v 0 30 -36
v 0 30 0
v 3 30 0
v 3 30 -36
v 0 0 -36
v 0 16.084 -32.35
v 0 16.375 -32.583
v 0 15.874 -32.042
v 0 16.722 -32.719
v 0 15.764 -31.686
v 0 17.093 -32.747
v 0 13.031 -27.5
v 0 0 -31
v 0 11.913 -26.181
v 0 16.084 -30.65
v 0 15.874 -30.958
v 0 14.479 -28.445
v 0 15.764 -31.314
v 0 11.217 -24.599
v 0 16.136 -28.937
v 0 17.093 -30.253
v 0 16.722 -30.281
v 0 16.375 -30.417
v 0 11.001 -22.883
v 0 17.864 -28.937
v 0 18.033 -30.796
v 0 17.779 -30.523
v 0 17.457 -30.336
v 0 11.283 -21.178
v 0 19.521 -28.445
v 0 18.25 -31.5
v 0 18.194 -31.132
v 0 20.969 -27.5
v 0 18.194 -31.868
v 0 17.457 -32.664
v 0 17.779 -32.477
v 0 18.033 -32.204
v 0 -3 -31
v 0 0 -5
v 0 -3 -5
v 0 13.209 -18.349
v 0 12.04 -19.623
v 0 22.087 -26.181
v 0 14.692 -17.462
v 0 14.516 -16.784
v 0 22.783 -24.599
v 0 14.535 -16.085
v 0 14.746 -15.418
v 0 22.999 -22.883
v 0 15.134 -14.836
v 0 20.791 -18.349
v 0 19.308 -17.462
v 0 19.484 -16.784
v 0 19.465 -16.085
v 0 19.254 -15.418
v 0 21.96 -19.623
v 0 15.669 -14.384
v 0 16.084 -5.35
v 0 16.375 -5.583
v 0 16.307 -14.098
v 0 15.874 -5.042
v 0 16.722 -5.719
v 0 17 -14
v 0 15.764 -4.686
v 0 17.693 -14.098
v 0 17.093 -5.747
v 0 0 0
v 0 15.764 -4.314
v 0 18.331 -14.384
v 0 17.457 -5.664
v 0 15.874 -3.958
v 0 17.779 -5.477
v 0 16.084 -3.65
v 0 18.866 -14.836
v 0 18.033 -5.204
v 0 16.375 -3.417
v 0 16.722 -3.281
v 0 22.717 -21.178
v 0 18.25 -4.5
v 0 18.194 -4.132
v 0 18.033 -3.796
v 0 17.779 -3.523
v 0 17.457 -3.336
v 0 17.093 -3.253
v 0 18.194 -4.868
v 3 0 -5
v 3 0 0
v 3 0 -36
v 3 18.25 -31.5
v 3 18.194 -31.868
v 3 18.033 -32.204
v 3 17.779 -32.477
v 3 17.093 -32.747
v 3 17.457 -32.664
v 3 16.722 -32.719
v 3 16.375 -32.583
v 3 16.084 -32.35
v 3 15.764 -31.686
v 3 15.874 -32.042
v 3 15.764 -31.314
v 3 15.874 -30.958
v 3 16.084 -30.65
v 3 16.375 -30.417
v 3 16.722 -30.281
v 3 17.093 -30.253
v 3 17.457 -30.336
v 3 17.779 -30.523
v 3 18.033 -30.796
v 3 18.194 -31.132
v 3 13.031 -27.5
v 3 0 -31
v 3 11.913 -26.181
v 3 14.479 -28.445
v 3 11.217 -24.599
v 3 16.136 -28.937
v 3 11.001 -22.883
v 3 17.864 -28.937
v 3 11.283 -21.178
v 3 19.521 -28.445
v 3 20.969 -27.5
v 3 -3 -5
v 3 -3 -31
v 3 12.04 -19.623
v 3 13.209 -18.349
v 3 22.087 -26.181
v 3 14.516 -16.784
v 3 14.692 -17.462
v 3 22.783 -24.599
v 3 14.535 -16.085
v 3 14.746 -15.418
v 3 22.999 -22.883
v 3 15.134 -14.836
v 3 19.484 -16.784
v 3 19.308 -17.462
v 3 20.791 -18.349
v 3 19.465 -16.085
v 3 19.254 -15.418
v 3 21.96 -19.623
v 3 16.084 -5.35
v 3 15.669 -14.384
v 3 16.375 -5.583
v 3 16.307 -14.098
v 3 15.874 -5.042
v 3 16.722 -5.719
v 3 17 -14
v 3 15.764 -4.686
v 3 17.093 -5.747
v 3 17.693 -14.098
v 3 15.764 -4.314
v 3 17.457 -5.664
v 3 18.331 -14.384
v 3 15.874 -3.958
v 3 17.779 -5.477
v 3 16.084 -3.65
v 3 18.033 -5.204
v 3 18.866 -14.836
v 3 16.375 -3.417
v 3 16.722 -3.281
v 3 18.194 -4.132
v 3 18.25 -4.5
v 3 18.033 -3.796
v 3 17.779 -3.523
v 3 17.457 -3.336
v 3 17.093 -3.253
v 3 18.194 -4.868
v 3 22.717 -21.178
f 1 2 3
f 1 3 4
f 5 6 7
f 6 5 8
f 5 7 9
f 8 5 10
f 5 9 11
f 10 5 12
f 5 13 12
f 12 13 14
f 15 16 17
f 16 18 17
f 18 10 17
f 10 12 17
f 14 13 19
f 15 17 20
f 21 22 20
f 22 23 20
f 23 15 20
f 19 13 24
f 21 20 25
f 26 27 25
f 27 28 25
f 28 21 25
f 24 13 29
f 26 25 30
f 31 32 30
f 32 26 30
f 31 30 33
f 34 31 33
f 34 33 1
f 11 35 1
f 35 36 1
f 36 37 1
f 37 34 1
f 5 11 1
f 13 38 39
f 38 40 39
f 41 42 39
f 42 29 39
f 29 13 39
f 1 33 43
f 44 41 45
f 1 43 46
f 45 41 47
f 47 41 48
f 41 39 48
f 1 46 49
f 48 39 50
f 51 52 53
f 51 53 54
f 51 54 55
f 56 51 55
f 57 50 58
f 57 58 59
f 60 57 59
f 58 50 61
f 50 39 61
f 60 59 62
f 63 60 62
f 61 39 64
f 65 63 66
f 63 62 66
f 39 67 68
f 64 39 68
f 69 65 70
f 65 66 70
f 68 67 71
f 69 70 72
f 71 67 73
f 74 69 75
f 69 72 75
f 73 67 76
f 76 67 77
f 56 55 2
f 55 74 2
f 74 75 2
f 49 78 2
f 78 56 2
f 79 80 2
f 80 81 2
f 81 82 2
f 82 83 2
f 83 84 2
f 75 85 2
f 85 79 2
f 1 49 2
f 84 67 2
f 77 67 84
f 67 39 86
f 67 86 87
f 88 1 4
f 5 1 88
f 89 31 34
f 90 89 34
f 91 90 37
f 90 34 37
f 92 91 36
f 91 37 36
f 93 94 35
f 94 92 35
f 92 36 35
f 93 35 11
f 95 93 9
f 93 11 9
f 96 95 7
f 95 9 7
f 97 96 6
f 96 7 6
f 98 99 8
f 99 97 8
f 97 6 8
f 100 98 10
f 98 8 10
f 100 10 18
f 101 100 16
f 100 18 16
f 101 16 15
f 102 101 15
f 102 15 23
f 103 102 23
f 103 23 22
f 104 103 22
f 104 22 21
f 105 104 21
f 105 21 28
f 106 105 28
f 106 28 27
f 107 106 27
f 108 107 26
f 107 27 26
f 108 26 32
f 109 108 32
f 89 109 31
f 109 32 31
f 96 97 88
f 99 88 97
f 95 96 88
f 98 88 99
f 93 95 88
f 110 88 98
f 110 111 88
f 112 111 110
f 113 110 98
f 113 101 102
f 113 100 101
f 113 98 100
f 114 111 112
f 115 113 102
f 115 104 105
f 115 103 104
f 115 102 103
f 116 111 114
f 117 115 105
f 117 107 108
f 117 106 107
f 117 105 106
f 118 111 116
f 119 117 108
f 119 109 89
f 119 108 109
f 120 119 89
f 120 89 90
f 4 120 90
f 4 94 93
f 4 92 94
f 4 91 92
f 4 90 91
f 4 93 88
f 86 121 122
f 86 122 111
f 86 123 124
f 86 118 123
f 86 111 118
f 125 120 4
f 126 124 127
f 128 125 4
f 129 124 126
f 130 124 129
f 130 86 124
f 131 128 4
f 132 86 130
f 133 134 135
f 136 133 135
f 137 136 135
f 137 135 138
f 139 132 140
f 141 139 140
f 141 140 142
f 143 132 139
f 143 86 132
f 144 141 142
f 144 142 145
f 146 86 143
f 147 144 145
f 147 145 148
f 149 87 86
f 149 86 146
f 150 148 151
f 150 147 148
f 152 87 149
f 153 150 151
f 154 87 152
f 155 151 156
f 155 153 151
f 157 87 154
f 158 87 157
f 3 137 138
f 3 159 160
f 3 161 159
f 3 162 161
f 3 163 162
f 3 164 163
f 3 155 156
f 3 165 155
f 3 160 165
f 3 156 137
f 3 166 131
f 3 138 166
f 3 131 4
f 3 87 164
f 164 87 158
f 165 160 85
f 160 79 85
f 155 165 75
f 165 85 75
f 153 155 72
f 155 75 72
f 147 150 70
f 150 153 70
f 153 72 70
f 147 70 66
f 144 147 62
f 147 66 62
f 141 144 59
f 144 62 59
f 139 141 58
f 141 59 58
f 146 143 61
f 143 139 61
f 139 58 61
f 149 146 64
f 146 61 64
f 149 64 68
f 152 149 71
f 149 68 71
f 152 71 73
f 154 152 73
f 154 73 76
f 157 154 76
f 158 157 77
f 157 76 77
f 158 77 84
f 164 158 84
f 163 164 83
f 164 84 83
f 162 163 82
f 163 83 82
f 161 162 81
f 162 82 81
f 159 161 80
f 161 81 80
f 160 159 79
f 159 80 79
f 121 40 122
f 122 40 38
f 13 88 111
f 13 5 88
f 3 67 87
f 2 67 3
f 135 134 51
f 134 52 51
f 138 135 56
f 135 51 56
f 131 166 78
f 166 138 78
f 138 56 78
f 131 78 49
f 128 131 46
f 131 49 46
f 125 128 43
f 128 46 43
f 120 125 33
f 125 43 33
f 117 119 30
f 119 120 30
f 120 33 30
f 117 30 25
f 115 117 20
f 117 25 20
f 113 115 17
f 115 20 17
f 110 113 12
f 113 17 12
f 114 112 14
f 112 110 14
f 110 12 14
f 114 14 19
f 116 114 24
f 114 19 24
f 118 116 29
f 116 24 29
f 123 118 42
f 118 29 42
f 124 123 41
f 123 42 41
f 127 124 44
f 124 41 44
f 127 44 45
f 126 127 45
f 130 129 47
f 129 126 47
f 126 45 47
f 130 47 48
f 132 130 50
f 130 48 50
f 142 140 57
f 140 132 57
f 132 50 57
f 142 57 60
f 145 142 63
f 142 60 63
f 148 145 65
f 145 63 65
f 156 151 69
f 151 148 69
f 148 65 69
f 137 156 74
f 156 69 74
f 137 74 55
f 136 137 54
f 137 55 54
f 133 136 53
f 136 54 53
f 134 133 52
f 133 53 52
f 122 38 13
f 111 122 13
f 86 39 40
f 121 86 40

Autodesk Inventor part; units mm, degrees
ref_plane "YZ Plane" through (0, 0, 0) normal (1, 0, 0) x (0, 1, 0)
ref_plane "XZ Plane" through (0, 0, 0) normal (0, 1, 0) x (-1, 0, 0)
ref_plane "XY Plane" through (0, 0, 0) normal (0, 0, 1) x (1, 0, 0)
sketch "Szkic1" plane through (0, 0, 0) normal (0, 1, 0) x (-1, 0, 0)
  point P0 (0, 0)
sketch "Szkic2" plane through (0, 0, 0) normal (1, 0, 0) x (0, 1, 0)
  point P0 (0, 0)
sketch "Szkic3" plane through (0, 0, 0) normal (1, 0, 0) x (0, 1, 0)
  line L0 (0, 0) -> (30, 0)
  line L1 (30, 0) -> (30, -36)
  line L2 (30, -36) -> (0, -36)
  line L3 (0, -5) -> (-3, -5)
  line L4 (-3, -5) -> (-3, -31)
  line L5 (-3, -31) -> (0, -31)
  line L6 (0, -36) -> (0, -31)
  line L7 (0, -5) -> (0, 0)
  arc A0 (14.6923, -17.4615) -> (19.3077, -17.4615) centre (17, -23) ccw
  arc A1 (19.3077, -17.4615) -> (14.6923, -17.4615) centre (17, -16.5) ccw
  circle A2 centre (17, -31.5) radius 1.25
  circle A3 centre (17, -4.5) radius 1.25
  dimension "d1" = 36
  dimension "d4" = 5
  dimension "d5" = 26
  dimension "d6" = 3
  dimension "d7" = 30
  dimension "d8" = 13
  dimension "d9" = 13
  dimension "d10" = 4.5
  dimension "d11" = 4.5
  dimension "d12" = 6.5
  dimension "d13" = 12
  dimension "d14" = 5
  dimension "d15" = 2.5
  dimension "d16" = 2.5
extrude "Wyciągnięcie proste1" add sketch "Szkic3" along normal blind 3
properties part number "Podstawa-mocowanie serwa" material "Drewno (wiśnia)"
